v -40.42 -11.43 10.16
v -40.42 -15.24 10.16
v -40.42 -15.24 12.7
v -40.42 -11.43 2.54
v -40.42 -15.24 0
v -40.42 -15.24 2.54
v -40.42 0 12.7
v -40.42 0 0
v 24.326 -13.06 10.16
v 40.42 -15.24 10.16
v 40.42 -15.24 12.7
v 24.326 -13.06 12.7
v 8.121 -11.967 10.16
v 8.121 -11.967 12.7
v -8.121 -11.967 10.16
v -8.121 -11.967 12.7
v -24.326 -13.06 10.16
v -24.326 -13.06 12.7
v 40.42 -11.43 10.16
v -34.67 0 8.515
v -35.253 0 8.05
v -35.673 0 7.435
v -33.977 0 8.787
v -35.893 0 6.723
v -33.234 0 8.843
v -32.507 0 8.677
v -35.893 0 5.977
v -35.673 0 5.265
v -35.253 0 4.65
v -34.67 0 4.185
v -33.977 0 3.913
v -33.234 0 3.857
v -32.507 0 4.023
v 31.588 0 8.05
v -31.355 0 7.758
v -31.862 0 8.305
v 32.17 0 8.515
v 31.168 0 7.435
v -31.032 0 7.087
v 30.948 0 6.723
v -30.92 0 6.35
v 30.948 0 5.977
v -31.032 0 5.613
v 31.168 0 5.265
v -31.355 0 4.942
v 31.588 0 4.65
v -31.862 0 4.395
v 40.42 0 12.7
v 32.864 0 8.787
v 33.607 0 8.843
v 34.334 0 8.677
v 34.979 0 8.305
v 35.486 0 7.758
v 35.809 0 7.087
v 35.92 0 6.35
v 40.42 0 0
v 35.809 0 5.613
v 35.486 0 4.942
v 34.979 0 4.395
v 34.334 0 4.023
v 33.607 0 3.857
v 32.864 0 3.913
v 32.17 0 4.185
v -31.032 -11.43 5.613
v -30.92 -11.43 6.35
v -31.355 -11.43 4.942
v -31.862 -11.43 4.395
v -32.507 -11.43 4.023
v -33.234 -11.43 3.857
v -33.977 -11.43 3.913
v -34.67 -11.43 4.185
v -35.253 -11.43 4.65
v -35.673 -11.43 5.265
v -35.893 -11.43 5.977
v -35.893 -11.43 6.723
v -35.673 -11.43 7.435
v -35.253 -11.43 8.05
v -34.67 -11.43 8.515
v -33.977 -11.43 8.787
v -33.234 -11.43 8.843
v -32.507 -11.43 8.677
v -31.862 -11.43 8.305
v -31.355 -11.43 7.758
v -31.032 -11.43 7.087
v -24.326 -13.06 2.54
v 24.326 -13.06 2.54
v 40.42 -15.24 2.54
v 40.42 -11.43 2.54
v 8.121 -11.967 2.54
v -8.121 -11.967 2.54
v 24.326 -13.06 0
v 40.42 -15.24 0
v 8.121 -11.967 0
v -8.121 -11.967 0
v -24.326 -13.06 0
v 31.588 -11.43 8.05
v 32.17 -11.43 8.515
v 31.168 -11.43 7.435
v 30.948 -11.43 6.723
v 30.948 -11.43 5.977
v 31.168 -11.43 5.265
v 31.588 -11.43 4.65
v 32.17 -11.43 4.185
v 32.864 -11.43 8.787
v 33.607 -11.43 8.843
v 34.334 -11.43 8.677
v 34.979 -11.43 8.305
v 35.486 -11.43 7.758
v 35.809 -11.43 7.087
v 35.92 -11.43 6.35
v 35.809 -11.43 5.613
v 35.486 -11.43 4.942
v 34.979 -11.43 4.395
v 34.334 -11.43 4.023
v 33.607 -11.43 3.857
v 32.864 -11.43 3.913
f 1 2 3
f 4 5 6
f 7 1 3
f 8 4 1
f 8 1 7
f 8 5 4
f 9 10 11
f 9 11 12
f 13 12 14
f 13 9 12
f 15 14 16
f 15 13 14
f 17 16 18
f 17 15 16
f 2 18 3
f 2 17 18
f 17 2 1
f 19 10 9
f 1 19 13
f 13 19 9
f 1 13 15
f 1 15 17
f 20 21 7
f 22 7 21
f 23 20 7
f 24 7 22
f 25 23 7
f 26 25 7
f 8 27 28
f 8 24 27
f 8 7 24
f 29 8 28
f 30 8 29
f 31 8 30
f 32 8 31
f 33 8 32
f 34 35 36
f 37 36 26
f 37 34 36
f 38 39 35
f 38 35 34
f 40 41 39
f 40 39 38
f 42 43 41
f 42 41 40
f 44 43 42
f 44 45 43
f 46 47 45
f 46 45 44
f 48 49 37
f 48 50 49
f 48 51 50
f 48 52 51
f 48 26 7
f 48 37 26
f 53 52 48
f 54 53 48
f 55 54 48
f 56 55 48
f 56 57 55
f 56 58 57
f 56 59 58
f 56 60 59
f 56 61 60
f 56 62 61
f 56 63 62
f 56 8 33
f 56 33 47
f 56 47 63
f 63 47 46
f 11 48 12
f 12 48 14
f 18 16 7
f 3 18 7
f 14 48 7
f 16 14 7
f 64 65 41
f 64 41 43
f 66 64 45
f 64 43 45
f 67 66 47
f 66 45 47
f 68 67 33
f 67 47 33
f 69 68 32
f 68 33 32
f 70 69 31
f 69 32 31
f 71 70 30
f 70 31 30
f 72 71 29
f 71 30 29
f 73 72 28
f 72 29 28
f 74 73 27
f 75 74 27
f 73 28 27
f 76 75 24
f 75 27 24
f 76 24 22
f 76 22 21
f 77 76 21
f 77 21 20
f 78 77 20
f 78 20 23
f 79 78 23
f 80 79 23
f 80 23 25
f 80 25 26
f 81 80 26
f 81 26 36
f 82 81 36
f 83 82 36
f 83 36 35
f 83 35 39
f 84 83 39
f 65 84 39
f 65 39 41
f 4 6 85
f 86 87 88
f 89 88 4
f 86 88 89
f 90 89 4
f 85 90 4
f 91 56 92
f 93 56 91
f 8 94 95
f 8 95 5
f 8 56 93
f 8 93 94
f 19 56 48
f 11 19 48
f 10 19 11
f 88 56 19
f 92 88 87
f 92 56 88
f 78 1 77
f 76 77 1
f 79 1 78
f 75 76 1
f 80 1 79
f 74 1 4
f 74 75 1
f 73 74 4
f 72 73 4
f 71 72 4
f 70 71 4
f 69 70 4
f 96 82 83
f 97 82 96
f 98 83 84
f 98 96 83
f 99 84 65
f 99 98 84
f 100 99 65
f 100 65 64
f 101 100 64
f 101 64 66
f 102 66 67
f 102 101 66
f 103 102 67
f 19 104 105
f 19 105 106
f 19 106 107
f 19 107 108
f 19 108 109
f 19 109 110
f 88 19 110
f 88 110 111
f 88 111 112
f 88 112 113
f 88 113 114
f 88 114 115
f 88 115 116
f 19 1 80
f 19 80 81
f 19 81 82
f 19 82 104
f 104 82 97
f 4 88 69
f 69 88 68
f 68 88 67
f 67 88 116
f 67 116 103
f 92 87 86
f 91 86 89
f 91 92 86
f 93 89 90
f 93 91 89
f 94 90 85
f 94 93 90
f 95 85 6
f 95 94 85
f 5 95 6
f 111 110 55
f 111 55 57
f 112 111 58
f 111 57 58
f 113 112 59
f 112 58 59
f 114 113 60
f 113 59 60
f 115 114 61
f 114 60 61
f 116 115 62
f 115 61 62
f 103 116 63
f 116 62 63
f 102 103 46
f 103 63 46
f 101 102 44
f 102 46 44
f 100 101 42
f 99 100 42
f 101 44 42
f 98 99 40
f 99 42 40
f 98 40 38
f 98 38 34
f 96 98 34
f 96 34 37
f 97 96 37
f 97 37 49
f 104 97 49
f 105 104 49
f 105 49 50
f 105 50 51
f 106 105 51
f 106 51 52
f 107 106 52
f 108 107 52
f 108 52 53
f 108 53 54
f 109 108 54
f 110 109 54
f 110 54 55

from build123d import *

# Parameters (mm, degrees)
BOSS_EXTRUDE1_DEPTH = 12.7
SKETCH2_R           = 2.5
CUT_EXTRUDE1_DEPTH  = 16.24
SKETCH3_W           = 7.62
SKETCH3_H           = 3.81
CUT_EXTRUDE2_DEPTH  = 81.8409129


with BuildPart() as part:
    # Sketch1 → Boss-Extrude1 (new body)
    with BuildSketch(Plane.XY):
        with BuildLine():
            Line((-40.4204564, 0), (40.4204564, 0))
            Line((40.4204564, 0), (40.4204564, -15.24))
            ThreePointArc((40.4204564, -15.24), (0, -11.830472076), (-40.4204564, -15.24))
            Line((-40.4204564, -15.24), (-40.4204564, 0))
        make_face()
    extrude(amount=BOSS_EXTRUDE1_DEPTH)

    # Sketch2 → Cut-Extrude1 (cut, through all)
    with BuildSketch(Plane(origin=(0, 0, 0), x_dir=(1, 0, 0), z_dir=(0, 1, 0))):
        with Locations((-33.4204564, -6.35)):
            Circle(SKETCH2_R)
        with Locations((33.4204564, -6.35)):
            Circle(SKETCH2_R)
    extrude(amount=-CUT_EXTRUDE1_DEPTH, mode=Mode.SUBTRACT)

    # Sketch3 → Cut-Extrude2 (cut, through all)
    with BuildSketch(Plane(origin=(40.4204564, 0, 0), x_dir=(0, 0, -1), z_dir=(1, 0, 0))):
        with Locations((-6.35, -13.335)):
            Rectangle(SKETCH3_W, SKETCH3_H)
    extrude(amount=-CUT_EXTRUDE2_DEPTH, mode=Mode.SUBTRACT)


solid = part.part
